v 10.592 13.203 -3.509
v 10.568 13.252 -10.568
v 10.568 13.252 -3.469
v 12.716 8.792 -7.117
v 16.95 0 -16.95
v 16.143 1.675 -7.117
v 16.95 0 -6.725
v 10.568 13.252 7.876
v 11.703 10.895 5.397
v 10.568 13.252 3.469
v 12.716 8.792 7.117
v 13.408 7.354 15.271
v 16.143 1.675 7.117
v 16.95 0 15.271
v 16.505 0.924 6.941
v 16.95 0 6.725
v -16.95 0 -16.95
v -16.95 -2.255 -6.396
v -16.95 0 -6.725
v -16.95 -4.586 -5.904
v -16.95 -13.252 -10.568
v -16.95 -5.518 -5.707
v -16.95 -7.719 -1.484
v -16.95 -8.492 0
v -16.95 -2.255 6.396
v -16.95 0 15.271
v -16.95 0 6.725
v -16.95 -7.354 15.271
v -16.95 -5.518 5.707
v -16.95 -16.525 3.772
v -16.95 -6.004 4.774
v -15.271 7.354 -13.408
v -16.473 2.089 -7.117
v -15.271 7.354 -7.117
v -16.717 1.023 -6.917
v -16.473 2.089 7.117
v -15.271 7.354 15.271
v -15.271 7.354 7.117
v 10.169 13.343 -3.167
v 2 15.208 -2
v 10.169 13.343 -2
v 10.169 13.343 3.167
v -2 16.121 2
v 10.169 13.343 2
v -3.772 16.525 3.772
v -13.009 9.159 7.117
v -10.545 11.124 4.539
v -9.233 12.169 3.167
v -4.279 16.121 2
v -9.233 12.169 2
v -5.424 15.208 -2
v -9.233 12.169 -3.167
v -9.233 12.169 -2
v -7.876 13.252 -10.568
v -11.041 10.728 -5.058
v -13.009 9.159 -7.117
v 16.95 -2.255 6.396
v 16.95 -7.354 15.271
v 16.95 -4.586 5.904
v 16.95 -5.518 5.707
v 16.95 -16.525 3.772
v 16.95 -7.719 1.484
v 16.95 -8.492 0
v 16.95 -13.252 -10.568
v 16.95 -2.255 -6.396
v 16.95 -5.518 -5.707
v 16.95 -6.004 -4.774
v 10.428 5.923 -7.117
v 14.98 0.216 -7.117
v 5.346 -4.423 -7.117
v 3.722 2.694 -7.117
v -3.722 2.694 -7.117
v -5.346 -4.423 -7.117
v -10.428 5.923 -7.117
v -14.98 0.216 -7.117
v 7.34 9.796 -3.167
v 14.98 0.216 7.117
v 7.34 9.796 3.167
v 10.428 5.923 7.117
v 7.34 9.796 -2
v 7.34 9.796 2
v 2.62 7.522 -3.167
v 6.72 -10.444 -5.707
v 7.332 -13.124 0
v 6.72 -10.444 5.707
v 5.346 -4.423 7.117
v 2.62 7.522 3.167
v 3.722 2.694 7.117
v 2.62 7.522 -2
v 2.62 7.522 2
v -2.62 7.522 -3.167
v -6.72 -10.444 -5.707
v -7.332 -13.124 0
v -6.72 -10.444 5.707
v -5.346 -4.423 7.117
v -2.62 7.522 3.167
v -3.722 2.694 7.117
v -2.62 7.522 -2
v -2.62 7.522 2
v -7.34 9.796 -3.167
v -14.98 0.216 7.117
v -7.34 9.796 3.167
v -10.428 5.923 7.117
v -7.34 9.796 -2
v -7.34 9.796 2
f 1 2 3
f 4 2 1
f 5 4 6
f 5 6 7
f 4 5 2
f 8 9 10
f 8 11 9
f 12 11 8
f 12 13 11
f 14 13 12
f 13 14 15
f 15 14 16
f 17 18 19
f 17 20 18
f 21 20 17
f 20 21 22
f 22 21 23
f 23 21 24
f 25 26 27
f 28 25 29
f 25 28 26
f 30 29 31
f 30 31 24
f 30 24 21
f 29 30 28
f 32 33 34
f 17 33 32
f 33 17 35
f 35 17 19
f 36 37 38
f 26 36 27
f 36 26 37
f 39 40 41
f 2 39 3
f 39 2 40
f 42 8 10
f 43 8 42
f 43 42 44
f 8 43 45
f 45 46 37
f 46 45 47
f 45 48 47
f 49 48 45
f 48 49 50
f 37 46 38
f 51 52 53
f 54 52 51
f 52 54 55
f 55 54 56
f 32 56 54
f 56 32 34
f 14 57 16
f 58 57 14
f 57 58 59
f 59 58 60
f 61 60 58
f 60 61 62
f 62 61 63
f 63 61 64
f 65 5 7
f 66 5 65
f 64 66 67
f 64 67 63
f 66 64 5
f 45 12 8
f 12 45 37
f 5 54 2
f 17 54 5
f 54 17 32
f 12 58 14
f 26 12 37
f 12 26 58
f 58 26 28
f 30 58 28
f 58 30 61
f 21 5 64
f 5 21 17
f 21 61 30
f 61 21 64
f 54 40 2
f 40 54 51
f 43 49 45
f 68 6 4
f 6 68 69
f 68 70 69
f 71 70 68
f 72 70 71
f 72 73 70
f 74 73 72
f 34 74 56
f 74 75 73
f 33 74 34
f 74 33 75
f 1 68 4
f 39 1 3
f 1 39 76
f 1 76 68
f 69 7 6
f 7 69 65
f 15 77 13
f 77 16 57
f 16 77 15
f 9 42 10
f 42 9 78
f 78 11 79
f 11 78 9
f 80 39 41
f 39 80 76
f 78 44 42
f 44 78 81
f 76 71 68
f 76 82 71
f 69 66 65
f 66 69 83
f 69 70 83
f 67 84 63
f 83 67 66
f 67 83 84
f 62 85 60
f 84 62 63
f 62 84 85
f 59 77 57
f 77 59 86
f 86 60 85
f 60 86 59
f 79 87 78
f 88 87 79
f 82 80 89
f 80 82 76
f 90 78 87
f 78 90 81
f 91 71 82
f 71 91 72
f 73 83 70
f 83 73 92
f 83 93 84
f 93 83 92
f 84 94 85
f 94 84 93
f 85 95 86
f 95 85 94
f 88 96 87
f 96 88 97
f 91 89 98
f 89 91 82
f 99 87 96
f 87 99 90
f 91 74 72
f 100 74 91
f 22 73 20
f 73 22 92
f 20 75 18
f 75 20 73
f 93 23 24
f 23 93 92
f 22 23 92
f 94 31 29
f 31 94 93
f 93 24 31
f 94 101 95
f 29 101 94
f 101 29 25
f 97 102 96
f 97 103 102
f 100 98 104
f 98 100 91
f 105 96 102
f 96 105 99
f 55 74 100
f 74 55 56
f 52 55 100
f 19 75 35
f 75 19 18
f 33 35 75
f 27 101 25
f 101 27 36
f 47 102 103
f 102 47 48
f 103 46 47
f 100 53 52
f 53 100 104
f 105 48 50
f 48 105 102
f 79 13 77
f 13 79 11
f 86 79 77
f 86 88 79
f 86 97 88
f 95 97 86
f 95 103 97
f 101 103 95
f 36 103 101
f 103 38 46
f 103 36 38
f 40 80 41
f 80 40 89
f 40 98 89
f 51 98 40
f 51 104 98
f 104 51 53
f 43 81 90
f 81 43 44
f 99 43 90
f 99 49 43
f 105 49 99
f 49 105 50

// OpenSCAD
// Name: BagBiner
// Creator: Cory Chapman (@cmchap)
// License: Creative Commons Attribution 
// Date Created: 2015 Nov 04
// About:
// This is a blatant ripoff of Tribe One's PackTach: 
// http://www.tribeoneoutdoors.com/packtach/
//
// It's used to attach carabiners to a sheet of cloth
// (e.g. on a bag) without puncturing
// a hole in the fabric. 

// preview[view:north east, tilt:top diagonal]

//Thinnest point of the carabiner's material
carabiner_thickness = 3.3;

//Maximum thickness of fabric to be used.
fabric_thickness = 2;

//Interior diameter of the end of the carabiner to be used. (The wider end probably works better.)
carabiner_ID = 22;

//Thickness of the final BagBiner. 
thickness = 6;

//Smoothness of the curves. Higher numbers take longer to render. It's printable without supports if this is set to 6 or 7 (depending or print orientation).
fn = 7;

hole_diameter = carabiner_thickness*2+fabric_thickness*4;
slot_width = fabric_thickness*2;


total_height = hole_diameter*1.5+thickness*2;
total_length = total_height;
total_width = total_height;

difference(){
	intersection() {
		union() {
			hull(){
				cylinder(
					h = total_width,
					d = total_length,
					center = true,
					$fn=fn
				);
				translate([0,-1*total_height/2,0]) cube([total_length,total_height,total_width], center=true);
			}
		}
		rotate([0,90,0])
			cylinder(
				h = total_length,
				d = total_height,
				center = true,
				$fn=fn
			);
	}
	color("red")
	union() {
			translate([0,carabiner_ID-thickness/2,0])
				rotate_extrude(convexity = 10, $fn = fn*2)
					translate([carabiner_ID, 0, 0])
						hull(){
							translate([-1*hole_diameter/4,0,0])
								circle(d = hole_diameter, $fn = fn);
							translate([hole_diameter/4,0,0])
								circle(d = hole_diameter, $fn = fn);
						}
		rotate([0,90,0]) 
			translate([0,total_height/4,0])
					cube(
						[slot_width,total_height/2,total_length],
						center = true
					);
   }
}
